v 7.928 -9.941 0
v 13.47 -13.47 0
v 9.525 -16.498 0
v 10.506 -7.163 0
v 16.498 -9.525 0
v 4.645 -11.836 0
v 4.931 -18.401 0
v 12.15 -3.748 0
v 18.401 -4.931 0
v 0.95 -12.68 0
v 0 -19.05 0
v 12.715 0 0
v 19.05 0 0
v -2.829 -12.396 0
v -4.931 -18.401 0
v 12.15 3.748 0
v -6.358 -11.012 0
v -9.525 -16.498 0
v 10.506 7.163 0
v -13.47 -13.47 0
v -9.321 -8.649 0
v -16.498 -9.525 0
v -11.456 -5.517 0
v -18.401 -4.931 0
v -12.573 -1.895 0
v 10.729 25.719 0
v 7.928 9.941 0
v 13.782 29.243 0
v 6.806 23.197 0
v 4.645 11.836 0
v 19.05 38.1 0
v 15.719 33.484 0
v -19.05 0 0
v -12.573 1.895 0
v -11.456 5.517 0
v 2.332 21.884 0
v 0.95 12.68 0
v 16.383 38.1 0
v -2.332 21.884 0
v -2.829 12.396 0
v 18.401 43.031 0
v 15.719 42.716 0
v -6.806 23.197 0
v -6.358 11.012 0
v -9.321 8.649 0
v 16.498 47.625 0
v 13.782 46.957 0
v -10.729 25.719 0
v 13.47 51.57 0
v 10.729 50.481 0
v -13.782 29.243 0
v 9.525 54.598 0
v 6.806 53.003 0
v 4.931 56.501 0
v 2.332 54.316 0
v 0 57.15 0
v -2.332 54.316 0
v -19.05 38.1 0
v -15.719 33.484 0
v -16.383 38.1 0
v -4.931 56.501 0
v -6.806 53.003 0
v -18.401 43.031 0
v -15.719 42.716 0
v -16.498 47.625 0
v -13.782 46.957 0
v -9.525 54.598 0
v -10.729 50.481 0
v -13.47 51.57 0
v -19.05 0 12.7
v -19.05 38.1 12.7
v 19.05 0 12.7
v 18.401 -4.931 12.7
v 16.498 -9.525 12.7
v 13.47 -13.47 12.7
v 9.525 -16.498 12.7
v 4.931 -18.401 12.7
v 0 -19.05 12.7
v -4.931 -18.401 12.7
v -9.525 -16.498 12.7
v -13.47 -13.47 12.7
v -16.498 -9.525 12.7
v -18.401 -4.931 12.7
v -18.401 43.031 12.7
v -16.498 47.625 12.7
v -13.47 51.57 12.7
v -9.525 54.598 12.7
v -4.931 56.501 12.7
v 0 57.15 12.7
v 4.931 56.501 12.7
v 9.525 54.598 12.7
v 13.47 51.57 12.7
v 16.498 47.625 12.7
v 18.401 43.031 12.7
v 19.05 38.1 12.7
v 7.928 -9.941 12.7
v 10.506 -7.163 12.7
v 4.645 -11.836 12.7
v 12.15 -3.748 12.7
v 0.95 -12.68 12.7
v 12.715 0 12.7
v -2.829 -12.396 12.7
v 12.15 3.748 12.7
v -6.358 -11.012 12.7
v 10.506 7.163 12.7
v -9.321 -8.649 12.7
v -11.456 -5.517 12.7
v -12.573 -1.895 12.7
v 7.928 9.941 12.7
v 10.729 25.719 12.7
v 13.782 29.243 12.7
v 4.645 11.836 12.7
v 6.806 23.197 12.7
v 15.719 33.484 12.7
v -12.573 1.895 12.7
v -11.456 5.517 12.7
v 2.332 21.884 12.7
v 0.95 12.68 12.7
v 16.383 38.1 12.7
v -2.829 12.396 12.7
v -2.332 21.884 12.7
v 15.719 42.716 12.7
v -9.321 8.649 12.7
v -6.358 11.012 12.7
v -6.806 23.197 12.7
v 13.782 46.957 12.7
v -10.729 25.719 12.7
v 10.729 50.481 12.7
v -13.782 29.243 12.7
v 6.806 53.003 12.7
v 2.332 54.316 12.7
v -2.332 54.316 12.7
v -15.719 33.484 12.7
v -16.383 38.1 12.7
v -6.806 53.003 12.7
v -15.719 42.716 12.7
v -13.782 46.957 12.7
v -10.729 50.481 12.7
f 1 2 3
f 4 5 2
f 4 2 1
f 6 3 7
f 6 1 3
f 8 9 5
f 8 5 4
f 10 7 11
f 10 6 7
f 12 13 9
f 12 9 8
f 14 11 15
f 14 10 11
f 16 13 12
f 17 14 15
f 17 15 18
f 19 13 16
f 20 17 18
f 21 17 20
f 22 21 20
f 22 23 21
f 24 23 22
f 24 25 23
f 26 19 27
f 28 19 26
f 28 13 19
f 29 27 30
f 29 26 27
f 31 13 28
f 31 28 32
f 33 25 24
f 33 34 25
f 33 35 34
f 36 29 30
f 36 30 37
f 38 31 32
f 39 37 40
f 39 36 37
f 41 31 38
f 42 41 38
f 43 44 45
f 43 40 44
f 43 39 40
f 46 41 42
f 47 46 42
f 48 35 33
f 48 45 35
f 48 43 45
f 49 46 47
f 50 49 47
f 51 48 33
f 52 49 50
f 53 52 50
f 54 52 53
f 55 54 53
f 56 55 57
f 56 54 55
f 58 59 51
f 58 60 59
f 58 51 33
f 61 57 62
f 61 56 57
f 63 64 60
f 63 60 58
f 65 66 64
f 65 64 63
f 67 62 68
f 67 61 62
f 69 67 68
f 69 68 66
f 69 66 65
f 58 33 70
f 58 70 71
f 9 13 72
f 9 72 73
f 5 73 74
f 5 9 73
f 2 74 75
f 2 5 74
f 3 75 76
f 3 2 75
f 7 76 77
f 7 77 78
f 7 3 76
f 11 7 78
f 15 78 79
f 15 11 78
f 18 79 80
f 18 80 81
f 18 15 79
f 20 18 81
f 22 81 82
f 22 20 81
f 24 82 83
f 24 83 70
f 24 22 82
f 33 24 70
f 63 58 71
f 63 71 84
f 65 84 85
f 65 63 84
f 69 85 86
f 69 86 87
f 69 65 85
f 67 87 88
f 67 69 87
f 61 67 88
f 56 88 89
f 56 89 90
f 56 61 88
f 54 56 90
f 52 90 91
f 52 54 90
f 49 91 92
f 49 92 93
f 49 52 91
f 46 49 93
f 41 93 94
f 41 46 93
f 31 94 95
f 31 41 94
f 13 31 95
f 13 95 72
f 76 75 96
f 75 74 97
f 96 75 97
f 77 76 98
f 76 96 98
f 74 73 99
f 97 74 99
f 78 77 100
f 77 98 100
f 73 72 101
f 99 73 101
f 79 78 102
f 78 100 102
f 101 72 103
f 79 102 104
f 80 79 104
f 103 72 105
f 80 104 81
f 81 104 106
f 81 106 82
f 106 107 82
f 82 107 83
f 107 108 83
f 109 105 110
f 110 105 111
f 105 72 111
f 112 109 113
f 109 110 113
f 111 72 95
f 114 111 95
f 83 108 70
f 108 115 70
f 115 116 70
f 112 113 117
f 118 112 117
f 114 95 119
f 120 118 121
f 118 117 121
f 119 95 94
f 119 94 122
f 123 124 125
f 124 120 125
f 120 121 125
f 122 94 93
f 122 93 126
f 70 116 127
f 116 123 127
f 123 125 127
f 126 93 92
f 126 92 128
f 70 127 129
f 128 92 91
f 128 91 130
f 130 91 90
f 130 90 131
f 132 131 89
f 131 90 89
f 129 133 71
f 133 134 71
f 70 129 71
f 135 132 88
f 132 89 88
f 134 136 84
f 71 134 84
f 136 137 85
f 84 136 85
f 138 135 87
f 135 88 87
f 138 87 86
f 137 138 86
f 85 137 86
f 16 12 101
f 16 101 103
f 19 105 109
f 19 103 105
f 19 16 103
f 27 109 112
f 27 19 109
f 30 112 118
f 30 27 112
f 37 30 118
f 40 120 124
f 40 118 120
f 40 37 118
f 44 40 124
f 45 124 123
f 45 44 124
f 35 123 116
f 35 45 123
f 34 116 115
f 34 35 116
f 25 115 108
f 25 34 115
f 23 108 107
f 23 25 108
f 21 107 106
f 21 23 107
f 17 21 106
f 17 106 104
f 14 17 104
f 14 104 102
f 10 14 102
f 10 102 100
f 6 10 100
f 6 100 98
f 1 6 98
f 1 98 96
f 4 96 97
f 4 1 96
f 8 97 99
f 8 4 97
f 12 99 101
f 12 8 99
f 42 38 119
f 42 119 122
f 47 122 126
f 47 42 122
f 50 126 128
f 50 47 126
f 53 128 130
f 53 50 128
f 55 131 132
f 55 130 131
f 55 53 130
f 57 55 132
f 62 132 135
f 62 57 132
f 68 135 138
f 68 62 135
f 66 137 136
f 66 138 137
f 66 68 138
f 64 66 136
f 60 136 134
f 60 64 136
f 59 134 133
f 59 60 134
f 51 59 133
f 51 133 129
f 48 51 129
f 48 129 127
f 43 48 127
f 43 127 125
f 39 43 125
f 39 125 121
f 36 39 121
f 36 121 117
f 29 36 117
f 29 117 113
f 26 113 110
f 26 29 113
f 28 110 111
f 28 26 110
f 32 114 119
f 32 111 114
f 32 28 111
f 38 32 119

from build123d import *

# Parameters (mm, degrees)
BOSS_EXTRUDE1_DEPTH     = 12.7
CUT_EXTRUDE1_DEPTH      = 62.565534189
CUT_EXTRUDE1_DEPTH_BACK = 62.565534189
SKETCH2_R               = 12.71524
CUT_EXTRUDE2_DEPTH      = 62.565534189
CUT_EXTRUDE2_DEPTH_BACK = 62.565534189
SKETCH3_R               = 16.383


with BuildPart() as part:
    # Sketch1 → Boss-Extrude1 (new body)
    with BuildSketch(Plane.XY):
        with BuildLine():
            Line((-19.05, 0), (-19.05, 38.1))
            ThreePointArc((-19.05, 38.1), (0, 57.15), (19.05, 38.1))
            Line((19.05, 38.1), (19.05, 0))
            ThreePointArc((19.05, 0), (0, -19.05), (-19.05, 0))
        make_face()
    extrude(amount=BOSS_EXTRUDE1_DEPTH)

    # Sketch2 → Cut-Extrude1 (cut, two sides: drawn at the far end of the back side and taken through both)
    with BuildSketch(Plane.XY.offset(12.7).offset(-CUT_EXTRUDE1_DEPTH_BACK)):
        Circle(SKETCH2_R)
    extrude(amount=CUT_EXTRUDE1_DEPTH + CUT_EXTRUDE1_DEPTH_BACK, mode=Mode.SUBTRACT)

    # Sketch3 → Cut-Extrude2 (cut, two sides: drawn at the far end of the back side and taken through both)
    with BuildSketch(Plane.XY.offset(12.7).offset(-CUT_EXTRUDE2_DEPTH_BACK)):
        with Locations((0, 38.1)):
            Circle(SKETCH3_R)
    extrude(amount=CUT_EXTRUDE2_DEPTH + CUT_EXTRUDE2_DEPTH_BACK, mode=Mode.SUBTRACT)


solid = part.part
